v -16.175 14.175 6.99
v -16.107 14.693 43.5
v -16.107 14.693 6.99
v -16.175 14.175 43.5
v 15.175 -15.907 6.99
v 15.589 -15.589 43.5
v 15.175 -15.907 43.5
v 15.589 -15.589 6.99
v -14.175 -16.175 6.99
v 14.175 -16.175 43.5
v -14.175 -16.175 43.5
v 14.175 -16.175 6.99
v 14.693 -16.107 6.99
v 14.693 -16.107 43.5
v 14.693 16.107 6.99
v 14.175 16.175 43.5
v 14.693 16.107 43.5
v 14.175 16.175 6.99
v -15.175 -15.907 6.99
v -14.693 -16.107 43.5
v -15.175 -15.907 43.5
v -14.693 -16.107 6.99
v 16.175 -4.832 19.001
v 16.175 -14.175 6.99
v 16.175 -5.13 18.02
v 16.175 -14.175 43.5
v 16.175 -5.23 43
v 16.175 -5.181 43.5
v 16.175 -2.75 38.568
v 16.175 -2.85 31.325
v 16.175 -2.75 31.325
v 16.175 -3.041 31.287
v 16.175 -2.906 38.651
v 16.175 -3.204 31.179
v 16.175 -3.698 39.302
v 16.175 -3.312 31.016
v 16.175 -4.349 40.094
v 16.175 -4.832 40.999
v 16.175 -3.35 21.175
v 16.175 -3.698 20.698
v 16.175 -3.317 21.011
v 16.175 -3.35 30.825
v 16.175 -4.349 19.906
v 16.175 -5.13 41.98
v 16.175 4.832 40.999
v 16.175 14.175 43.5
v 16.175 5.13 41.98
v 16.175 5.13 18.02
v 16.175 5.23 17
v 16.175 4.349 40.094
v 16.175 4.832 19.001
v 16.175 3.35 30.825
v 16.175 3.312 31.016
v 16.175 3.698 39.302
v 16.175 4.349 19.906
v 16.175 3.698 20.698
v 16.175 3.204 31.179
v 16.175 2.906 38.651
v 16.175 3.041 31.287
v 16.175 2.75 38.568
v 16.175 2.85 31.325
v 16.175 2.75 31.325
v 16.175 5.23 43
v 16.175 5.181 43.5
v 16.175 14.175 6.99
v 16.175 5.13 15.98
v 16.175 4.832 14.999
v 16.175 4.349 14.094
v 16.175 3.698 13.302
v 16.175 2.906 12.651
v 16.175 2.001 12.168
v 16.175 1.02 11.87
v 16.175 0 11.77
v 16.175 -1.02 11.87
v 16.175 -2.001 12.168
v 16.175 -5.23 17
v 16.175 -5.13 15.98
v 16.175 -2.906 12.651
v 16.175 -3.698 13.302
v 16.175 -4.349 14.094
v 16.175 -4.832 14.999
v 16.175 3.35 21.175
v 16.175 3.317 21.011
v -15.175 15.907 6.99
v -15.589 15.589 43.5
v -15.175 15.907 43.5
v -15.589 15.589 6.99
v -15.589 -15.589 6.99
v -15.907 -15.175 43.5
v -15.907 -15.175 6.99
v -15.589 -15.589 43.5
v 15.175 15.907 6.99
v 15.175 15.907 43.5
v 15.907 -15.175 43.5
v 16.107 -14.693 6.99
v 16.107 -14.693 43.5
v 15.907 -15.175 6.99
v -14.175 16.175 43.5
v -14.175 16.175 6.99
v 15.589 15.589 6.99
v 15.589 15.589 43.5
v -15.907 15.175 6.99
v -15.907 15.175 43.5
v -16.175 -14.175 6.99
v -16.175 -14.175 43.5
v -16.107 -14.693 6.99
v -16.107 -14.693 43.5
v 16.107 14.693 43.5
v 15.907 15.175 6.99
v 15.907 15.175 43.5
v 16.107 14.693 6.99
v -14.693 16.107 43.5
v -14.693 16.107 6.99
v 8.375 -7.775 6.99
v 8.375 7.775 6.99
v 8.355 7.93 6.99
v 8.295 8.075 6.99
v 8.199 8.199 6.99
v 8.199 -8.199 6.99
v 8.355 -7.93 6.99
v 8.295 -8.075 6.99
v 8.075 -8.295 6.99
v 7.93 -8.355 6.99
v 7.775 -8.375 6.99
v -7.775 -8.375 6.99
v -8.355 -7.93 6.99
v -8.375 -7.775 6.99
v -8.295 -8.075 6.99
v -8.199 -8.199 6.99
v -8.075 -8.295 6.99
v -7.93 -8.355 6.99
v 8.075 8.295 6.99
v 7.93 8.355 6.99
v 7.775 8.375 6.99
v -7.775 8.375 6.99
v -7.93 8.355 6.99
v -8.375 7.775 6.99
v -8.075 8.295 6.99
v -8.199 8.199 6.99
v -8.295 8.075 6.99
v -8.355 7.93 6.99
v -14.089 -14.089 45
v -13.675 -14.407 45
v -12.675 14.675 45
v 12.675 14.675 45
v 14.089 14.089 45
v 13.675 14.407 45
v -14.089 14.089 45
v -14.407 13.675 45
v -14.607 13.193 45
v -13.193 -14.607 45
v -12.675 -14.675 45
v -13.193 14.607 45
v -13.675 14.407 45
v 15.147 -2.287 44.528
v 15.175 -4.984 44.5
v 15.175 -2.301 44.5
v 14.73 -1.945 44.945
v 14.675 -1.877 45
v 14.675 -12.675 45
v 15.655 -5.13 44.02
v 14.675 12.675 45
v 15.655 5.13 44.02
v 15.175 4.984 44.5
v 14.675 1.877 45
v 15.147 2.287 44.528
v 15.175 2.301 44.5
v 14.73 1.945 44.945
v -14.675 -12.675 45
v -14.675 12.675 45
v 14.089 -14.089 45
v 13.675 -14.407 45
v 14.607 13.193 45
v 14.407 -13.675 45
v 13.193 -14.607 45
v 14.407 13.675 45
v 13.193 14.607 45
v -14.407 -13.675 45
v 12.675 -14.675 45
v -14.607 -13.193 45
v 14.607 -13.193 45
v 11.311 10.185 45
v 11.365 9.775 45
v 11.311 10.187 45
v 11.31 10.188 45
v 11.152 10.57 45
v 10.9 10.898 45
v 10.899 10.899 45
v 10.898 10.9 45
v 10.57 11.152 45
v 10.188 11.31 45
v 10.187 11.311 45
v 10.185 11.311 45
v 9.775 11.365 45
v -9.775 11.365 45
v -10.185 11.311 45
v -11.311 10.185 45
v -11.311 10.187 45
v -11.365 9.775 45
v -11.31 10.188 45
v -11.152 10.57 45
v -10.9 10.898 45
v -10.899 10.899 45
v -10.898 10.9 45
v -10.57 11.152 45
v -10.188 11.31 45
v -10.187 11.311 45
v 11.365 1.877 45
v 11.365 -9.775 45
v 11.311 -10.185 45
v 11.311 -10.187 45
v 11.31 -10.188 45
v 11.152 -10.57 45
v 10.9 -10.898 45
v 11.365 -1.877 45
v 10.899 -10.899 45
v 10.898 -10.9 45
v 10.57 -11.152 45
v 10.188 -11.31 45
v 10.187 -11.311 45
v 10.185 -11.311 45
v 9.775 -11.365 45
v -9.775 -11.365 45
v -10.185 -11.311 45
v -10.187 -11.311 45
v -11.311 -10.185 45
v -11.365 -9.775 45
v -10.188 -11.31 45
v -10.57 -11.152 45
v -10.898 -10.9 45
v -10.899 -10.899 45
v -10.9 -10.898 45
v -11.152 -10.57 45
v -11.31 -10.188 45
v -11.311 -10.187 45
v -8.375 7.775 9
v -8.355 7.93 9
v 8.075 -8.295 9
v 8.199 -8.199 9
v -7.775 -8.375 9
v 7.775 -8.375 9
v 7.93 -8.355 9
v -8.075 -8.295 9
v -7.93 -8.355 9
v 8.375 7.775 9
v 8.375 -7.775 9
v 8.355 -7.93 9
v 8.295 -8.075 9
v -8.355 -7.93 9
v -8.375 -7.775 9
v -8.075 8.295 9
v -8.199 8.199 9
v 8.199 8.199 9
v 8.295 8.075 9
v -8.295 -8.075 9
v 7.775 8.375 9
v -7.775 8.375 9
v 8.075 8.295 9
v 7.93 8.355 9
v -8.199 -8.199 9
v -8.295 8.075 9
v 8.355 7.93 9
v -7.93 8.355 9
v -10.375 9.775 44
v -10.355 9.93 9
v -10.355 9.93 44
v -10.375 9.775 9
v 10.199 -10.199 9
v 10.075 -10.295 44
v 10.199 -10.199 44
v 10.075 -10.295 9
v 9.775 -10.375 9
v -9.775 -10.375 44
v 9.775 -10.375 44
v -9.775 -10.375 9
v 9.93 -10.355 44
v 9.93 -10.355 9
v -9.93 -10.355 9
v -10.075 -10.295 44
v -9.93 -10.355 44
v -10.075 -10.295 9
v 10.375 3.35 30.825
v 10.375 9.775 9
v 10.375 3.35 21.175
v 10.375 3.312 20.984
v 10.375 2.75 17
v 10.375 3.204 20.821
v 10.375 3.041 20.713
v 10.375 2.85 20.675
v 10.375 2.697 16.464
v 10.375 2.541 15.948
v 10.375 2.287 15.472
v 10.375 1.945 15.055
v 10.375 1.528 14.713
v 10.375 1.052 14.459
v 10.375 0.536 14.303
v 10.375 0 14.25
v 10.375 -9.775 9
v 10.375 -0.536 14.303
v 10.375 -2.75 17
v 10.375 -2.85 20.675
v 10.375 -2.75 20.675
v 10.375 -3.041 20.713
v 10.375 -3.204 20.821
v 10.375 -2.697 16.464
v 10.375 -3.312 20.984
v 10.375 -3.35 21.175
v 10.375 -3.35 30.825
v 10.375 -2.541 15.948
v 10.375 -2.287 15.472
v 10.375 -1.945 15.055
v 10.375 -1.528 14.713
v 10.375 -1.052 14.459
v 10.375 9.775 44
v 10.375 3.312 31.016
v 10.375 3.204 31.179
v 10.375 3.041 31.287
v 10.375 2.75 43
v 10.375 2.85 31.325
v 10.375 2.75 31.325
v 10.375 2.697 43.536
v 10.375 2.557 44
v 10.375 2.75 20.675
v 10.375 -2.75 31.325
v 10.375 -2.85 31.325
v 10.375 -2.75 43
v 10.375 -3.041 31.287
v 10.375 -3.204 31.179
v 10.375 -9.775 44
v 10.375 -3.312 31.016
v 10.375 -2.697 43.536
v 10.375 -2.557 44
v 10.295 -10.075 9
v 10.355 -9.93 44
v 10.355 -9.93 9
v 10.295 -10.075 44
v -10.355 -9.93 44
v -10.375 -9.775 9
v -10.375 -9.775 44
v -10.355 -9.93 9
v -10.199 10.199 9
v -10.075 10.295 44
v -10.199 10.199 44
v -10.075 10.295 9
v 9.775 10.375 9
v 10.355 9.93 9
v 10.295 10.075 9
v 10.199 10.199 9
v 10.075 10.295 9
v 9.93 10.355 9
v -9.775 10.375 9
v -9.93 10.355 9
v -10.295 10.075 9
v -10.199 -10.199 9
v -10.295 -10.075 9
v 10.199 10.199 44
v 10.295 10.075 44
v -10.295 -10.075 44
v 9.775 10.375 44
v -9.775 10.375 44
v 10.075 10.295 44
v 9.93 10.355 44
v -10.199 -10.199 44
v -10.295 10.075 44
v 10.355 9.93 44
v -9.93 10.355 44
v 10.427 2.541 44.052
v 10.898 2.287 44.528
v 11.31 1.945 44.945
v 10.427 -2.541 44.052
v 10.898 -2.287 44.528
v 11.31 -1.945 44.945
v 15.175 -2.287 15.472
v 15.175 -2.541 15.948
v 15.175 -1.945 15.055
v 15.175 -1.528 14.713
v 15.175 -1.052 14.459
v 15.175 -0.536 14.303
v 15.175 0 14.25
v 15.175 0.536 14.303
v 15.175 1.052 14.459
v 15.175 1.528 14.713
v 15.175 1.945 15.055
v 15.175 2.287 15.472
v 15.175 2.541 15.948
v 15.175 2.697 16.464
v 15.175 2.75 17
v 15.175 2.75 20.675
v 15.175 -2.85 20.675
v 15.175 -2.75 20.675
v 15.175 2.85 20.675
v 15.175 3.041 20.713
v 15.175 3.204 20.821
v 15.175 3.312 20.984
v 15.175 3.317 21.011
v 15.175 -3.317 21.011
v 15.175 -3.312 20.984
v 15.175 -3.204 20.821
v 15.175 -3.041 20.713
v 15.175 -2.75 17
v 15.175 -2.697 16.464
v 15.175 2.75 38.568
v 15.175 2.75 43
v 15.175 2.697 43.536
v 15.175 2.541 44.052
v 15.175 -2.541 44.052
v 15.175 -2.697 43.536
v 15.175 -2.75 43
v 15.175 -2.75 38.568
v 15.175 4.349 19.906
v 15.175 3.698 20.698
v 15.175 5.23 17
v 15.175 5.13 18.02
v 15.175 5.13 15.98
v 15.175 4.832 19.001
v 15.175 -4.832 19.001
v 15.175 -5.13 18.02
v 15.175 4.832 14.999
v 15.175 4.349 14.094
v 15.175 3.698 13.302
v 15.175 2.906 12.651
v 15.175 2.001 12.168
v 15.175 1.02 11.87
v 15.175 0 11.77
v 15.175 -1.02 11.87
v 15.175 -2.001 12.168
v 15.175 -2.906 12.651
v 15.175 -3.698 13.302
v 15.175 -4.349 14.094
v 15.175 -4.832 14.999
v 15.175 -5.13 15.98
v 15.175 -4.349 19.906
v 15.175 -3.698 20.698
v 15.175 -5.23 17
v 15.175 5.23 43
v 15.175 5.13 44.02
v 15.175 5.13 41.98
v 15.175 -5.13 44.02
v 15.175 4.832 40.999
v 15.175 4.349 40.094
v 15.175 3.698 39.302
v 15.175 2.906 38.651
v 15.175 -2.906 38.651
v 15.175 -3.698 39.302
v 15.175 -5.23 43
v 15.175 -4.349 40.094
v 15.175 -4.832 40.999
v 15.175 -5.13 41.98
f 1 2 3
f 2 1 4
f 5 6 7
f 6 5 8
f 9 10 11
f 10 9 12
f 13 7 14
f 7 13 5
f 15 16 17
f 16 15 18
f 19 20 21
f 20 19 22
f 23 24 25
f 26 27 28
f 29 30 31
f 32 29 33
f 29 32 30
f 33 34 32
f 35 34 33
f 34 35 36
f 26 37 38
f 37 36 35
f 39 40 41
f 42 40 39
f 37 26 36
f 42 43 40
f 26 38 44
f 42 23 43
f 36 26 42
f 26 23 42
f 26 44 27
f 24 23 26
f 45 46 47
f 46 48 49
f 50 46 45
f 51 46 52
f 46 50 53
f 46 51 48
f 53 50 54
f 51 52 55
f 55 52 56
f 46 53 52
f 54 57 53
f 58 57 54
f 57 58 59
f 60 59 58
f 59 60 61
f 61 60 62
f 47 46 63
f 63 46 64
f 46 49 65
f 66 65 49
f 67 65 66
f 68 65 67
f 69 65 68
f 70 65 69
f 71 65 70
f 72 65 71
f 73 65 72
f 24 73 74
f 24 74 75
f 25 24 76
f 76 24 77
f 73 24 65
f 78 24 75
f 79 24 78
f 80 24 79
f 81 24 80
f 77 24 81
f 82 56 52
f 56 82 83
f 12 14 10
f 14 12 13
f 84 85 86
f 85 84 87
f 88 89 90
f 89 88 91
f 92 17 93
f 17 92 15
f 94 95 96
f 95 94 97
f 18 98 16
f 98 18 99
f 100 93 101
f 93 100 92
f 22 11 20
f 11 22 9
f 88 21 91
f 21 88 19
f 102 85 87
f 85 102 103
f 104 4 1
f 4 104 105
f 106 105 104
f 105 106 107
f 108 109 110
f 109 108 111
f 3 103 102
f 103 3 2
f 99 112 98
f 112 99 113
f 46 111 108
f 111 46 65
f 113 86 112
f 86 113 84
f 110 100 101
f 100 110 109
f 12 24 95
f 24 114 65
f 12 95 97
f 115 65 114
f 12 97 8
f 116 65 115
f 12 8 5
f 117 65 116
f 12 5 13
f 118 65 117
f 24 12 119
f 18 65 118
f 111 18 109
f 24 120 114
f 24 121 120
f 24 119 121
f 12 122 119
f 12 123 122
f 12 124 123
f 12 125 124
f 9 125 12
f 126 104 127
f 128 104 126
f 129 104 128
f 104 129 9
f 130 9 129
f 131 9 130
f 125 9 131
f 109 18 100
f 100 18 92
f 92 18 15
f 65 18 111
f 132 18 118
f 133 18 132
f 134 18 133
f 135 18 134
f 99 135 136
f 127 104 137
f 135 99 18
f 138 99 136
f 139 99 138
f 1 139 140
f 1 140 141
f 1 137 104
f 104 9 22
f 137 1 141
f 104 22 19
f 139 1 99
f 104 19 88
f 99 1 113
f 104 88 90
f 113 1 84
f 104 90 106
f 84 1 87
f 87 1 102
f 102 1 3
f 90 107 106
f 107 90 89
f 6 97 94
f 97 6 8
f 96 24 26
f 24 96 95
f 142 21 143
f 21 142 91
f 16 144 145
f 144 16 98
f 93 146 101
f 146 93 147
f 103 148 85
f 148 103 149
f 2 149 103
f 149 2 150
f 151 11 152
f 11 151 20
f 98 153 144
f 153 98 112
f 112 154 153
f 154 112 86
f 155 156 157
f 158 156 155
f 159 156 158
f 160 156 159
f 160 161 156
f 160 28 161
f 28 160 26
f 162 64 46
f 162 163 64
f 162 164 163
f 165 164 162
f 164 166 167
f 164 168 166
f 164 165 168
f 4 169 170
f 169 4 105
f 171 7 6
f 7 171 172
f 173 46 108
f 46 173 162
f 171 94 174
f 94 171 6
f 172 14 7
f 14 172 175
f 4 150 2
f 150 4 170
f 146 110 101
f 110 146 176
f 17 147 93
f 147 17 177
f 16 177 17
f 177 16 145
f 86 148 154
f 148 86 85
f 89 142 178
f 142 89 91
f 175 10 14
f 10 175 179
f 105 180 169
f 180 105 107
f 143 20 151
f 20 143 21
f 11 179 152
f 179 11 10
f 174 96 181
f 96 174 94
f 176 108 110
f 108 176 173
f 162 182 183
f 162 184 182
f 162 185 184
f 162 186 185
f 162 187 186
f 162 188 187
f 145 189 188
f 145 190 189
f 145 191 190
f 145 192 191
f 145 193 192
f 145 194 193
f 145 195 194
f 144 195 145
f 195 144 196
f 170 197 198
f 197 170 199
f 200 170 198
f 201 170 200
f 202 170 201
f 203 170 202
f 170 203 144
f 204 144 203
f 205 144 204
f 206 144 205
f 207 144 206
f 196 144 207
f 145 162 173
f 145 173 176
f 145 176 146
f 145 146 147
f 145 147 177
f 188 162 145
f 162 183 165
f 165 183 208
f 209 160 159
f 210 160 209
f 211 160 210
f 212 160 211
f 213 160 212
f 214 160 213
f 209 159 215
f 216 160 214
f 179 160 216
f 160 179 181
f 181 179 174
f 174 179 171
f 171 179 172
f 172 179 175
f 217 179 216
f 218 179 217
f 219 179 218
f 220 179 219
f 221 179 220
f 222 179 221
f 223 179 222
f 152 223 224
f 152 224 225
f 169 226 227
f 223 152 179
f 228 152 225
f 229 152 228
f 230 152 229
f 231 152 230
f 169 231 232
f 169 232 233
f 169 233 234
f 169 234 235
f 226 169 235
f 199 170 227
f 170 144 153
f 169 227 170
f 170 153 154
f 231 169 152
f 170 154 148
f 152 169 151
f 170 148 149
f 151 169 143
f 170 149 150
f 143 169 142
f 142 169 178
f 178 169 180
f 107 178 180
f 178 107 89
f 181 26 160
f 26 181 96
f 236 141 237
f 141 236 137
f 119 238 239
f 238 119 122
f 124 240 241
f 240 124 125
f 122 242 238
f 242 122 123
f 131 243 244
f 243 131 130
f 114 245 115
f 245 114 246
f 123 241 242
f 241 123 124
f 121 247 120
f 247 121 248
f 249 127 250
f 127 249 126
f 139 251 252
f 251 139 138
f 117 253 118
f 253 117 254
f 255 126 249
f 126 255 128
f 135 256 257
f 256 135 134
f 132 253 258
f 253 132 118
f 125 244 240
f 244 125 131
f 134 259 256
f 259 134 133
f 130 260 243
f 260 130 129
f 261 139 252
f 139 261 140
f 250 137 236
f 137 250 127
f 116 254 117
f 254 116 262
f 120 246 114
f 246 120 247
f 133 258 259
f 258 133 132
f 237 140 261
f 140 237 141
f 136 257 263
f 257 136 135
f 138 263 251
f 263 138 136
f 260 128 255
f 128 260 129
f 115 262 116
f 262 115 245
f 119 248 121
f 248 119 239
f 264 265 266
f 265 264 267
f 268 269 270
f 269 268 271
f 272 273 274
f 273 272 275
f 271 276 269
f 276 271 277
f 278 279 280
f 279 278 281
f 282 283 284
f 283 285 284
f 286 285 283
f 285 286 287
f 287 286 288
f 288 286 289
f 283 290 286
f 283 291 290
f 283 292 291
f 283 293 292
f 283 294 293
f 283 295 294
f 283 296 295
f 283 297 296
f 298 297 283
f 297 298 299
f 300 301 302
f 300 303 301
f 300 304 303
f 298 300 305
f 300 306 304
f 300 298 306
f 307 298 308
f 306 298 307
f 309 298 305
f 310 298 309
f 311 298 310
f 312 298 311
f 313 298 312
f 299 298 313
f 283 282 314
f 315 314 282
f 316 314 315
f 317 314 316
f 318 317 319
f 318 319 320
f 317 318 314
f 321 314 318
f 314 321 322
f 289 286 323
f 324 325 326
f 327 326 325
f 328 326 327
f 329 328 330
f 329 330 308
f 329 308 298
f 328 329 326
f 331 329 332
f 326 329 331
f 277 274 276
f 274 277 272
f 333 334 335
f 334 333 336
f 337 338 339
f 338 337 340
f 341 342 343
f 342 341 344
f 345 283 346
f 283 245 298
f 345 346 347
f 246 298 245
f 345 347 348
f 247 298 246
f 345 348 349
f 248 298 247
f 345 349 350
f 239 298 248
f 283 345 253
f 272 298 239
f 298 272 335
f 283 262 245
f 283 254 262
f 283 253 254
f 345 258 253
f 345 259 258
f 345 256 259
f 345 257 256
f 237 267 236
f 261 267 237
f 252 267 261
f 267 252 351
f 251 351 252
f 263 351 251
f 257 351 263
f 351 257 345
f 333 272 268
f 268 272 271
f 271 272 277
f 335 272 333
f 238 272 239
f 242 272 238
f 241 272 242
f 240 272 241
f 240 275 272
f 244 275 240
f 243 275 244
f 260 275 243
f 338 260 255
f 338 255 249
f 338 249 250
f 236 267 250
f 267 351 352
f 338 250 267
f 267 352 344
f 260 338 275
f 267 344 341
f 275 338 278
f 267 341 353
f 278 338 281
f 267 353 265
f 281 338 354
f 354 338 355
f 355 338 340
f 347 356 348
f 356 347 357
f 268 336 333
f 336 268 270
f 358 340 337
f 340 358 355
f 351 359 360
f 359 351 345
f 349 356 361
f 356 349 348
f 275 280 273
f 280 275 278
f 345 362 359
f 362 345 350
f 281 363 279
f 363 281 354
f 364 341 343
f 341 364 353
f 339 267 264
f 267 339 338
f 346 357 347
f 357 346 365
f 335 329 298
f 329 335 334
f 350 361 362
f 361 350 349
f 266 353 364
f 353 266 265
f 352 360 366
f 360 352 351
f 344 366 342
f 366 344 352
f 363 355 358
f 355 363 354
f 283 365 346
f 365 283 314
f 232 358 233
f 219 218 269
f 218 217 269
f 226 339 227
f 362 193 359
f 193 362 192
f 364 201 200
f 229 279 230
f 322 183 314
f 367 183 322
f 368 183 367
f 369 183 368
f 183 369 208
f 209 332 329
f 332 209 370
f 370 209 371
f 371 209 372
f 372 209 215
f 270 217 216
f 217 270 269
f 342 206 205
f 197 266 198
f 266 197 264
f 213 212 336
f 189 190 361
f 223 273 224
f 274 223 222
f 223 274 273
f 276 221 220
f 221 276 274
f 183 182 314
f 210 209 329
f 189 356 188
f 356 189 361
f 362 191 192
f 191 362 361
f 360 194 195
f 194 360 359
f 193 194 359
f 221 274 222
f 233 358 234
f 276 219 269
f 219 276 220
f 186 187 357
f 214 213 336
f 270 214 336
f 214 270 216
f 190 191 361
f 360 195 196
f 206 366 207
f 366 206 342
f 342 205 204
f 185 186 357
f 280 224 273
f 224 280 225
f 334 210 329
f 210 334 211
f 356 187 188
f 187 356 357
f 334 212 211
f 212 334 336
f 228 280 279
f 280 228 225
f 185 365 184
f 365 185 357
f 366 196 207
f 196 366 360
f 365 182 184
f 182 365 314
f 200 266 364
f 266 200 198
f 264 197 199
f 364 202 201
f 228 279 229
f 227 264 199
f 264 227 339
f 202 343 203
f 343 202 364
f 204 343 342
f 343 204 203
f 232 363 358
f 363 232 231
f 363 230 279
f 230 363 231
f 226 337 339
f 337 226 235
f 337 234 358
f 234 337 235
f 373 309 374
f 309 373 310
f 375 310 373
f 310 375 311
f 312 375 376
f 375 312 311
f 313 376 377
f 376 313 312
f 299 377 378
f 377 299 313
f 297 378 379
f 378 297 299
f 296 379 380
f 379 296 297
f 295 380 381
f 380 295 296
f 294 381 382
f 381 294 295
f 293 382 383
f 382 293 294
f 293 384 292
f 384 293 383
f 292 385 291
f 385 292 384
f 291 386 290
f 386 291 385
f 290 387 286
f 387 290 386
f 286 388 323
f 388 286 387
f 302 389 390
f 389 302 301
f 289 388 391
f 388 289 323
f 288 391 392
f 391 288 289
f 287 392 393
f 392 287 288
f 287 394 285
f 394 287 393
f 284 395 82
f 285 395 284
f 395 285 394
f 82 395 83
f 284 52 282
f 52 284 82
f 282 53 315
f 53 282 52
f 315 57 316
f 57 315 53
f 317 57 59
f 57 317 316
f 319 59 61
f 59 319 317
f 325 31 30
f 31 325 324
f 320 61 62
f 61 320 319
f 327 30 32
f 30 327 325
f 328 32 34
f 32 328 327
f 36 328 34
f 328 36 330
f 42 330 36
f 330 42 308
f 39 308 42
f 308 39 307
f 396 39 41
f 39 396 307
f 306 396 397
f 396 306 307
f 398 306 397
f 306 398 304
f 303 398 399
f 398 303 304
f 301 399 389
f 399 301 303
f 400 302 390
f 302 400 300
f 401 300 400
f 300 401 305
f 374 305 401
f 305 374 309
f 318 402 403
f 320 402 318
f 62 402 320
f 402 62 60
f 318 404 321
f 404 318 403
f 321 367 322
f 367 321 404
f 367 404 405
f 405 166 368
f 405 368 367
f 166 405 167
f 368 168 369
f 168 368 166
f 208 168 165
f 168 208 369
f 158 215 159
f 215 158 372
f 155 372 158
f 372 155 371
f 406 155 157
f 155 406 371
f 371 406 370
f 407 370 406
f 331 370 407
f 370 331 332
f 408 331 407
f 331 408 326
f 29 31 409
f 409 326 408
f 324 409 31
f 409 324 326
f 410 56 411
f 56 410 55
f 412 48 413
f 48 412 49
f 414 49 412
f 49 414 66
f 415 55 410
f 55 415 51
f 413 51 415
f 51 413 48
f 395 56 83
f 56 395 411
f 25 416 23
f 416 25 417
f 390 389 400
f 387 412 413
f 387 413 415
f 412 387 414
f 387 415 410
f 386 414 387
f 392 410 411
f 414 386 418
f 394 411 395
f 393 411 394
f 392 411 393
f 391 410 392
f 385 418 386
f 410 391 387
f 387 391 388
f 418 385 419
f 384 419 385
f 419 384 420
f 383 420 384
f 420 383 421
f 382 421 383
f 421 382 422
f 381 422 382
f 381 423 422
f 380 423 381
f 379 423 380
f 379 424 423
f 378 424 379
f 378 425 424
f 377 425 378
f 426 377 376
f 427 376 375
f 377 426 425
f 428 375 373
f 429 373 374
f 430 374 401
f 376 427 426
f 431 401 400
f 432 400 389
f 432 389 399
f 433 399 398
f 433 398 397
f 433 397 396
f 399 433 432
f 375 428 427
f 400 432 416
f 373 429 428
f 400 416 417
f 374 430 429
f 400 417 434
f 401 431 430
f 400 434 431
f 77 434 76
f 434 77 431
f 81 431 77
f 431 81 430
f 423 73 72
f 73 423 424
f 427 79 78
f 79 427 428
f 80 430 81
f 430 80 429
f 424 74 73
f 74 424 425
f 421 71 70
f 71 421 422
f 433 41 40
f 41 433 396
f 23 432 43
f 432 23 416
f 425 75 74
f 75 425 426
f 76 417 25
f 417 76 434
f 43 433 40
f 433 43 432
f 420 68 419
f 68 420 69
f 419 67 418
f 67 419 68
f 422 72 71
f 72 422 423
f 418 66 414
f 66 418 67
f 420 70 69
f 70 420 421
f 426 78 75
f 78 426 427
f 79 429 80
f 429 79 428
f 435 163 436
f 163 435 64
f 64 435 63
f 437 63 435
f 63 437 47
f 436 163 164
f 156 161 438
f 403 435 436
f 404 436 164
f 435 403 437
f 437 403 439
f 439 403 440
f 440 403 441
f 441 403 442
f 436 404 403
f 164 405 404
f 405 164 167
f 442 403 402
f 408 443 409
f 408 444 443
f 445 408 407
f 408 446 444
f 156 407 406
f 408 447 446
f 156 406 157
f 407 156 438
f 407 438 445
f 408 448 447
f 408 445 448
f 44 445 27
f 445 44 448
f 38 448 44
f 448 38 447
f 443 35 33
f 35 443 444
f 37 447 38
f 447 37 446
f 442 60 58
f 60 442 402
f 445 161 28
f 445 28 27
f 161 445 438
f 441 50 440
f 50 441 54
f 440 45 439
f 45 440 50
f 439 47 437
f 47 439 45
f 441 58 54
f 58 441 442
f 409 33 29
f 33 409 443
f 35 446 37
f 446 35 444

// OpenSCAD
// file: turntable-bearing.scad
// Salvaged lazy-susan bearing, from captures/2026-09-12-turntable.
// OD confirmed by hand in captures/README.md. Other values are estimates.
/* [Measured] */
outer_diameter = 140;
/* [Photo estimates - verify before fabrication] */
bore_diameter = 87;
race_diameter = 114;
race_gap = 0.6;
outer_hole_pcd = 128;
inner_hole_pcd = 102;
hole_diameter = 5;
countersink_diameter = 10;
countersink_depth = 2.5;
/* [Measured thickness] */
thickness = 8.5; // Confirmed by user.
/* [Display] */
inner_rotation = 45; // Relative hole pattern angle, independently rotating ring.
section_view = false;

function turntable_thickness() = thickness;
function turntable_od()        = outer_diameter;
function turntable_bore()      = bore_diameter;

module turntable_bearing(od=140,id=87,height=8.5,race=114,gap=0.6,
                        outer_pcd=128,inner_pcd=102,hole=5,
                        sink_d=10,sink_depth=2.5,angle=45,section=false) {
    assert(id>0 && id<race-gap && race+gap<od);
    assert(height>sink_depth && sink_depth>=0);
    assert(inner_pcd-hole>id && inner_pcd+hole<race-gap);
    assert(outer_pcd-sink_d>race+gap && outer_pcd+sink_d<od);
    difference() {
        union() {
            color([0.64,0.67,0.69]) difference() {
                cylinder(h=height,d=od,$fn=128);
                translate([0,0,-0.1]) cylinder(h=height+0.2,d=race+gap,$fn=128);
                for(a=[0:90:270]) rotate([0,0,a]) translate([outer_pcd/2,0,0]) {
                    translate([0,0,-0.1]) cylinder(h=height+0.2,d=hole,$fn=32);
                    translate([0,0,height-sink_depth])
                        cylinder(h=sink_depth+0.01,d1=hole,d2=sink_d,$fn=48);
                }
            }
            color([0.53,0.56,0.58]) rotate([0,0,angle]) difference() {
                cylinder(h=height,d=race-gap,$fn=128);
                translate([0,0,-0.1]) cylinder(h=height+0.2,d=id,$fn=128);
                for(a=[0:90:270]) rotate([0,0,a]) translate([inner_pcd/2,0,-0.1])
                    cylinder(h=height+0.2,d=hole,$fn=32);
            }
        }
        if(section) translate([-od,-od,-1]) cube([2*od,od,height+2]);
    }
}

// Two separated rings depict visible geometry only. Hidden raceways,
// balls and retaining features are unknown and intentionally unmodelled.
turntable_bearing(outer_diameter,bore_diameter,thickness,race_diameter,race_gap,
                  outer_hole_pcd,inner_hole_pcd,hole_diameter,
                  countersink_diameter,countersink_depth,inner_rotation,section_view);
// file: vslot-2020.scad
// OpenBuilds V-Slot 20x20, millimetres.
// Source: ../../datasheets/openbuilds-vslot-20x20.pdf, page 1.
// Open directly for a short inspection sample; `use` for library modules.
sample_length = 60;
section_only = false;

module vslot_2020_profile(corner_radius=0.5, centre_notch=0.2) {
    // Dimensioned features from drawing.
    half_size = 10;
    mouth_half = 9.16/2;
    throat_half = 6.25/2;
    channel_half = 11/2;
    shoulder_y = half_size - 1.80;
    floor_y = shoulder_y - 4.30;
    // 90-degree V: each face has a 45-degree slope.
    throat_y = half_size - (mouth_half-throat_half);
    // Adjacent diagonal cavity walls straddle y=x. Their normal
    // separation is the specified 1.50 mm web thickness.
    diagonal_offset = 1.50/sqrt(2);
    channel_knee_y = channel_half + diagonal_offset;
    floor_half = floor_y - diagonal_offset;

    // Corner radius and tiny floor-centre notch are visually estimated:
    // the PDF depicts them but does not dimension them.
    difference() {
        offset(r=corner_radius,$fn=24)
            square([20-2*corner_radius,20-2*corner_radius],center=true);
        circle(d=4.20,$fn=64);
        for(a=[0:90:270]) rotate(a)
            polygon([
                [-mouth_half,11], [mouth_half,11],
                [mouth_half,half_size], [throat_half,throat_y],
                [throat_half,shoulder_y], [channel_half,shoulder_y],
                [channel_half,channel_knee_y], [floor_half,floor_y],
                [centre_notch,floor_y], [0,floor_y-centre_notch],
                [-centre_notch,floor_y], [-floor_half,floor_y],
                [-channel_half,channel_knee_y], [-channel_half,shoulder_y],
                [-throat_half,shoulder_y], [-throat_half,throat_y],
                [-mouth_half,half_size]
            ]);
    }
}

module vslot_2020(length=500) {
    assert(length>0,"Rail length must be positive");
    linear_extrude(height=length,convexity=10) vslot_2020_profile();
}

if(section_only) vslot_2020_profile();
else color([0.66,0.71,0.75]) vslot_2020(sample_length);
// main file
// Socket test piece: the fins variant's boss, nothing else. Same 0.375 mm/side
// fit, through pocket with the mouth lead-in, the chamfered top edge and the
// 2 mm ledge at the bottom for the rail to sit on, and both bolt stations on
// one face,
// on the shared keyhole: one window between them, slotted down to the lower
// hole and up to the upper. It is built
// from z-base.scad's own modules, so a pass here is a pass on the base. Print
// flat, the end with the lead-in chamfer at the top.
//
// Fit: the rail should slide through by hand with no lean to speak of.
// Holes: rail through first. Start an M5 x 10 button head two turns into a
// tee nut, feed the nut through the window into the rail slot, slide the
// screw down (or up) the slot until the head drops into its counterbore.
use <z-base.scad>

test_h   = 45;     // height printed: the whole socket, since the shared keyhole spans it
stations = [10, 36];   // both stations, as on the base

top = zbase_height() - zbase_plate_t();   // socket height, once the plate is dropped
translate([0,0,-(top - test_h)]) intersection() {
    translate([0,0,-zbase_plate_t()]) difference() {
        boss_body();
        rail_pocket(through=true, ledge_z=zbase_plate_t());   // ledge at this piece's bottom
        tee_holes(stations);
        tee_counterbores(stations);
    }
    translate([-50,-50,top - test_h]) cube([100,100,test_h]);
}
